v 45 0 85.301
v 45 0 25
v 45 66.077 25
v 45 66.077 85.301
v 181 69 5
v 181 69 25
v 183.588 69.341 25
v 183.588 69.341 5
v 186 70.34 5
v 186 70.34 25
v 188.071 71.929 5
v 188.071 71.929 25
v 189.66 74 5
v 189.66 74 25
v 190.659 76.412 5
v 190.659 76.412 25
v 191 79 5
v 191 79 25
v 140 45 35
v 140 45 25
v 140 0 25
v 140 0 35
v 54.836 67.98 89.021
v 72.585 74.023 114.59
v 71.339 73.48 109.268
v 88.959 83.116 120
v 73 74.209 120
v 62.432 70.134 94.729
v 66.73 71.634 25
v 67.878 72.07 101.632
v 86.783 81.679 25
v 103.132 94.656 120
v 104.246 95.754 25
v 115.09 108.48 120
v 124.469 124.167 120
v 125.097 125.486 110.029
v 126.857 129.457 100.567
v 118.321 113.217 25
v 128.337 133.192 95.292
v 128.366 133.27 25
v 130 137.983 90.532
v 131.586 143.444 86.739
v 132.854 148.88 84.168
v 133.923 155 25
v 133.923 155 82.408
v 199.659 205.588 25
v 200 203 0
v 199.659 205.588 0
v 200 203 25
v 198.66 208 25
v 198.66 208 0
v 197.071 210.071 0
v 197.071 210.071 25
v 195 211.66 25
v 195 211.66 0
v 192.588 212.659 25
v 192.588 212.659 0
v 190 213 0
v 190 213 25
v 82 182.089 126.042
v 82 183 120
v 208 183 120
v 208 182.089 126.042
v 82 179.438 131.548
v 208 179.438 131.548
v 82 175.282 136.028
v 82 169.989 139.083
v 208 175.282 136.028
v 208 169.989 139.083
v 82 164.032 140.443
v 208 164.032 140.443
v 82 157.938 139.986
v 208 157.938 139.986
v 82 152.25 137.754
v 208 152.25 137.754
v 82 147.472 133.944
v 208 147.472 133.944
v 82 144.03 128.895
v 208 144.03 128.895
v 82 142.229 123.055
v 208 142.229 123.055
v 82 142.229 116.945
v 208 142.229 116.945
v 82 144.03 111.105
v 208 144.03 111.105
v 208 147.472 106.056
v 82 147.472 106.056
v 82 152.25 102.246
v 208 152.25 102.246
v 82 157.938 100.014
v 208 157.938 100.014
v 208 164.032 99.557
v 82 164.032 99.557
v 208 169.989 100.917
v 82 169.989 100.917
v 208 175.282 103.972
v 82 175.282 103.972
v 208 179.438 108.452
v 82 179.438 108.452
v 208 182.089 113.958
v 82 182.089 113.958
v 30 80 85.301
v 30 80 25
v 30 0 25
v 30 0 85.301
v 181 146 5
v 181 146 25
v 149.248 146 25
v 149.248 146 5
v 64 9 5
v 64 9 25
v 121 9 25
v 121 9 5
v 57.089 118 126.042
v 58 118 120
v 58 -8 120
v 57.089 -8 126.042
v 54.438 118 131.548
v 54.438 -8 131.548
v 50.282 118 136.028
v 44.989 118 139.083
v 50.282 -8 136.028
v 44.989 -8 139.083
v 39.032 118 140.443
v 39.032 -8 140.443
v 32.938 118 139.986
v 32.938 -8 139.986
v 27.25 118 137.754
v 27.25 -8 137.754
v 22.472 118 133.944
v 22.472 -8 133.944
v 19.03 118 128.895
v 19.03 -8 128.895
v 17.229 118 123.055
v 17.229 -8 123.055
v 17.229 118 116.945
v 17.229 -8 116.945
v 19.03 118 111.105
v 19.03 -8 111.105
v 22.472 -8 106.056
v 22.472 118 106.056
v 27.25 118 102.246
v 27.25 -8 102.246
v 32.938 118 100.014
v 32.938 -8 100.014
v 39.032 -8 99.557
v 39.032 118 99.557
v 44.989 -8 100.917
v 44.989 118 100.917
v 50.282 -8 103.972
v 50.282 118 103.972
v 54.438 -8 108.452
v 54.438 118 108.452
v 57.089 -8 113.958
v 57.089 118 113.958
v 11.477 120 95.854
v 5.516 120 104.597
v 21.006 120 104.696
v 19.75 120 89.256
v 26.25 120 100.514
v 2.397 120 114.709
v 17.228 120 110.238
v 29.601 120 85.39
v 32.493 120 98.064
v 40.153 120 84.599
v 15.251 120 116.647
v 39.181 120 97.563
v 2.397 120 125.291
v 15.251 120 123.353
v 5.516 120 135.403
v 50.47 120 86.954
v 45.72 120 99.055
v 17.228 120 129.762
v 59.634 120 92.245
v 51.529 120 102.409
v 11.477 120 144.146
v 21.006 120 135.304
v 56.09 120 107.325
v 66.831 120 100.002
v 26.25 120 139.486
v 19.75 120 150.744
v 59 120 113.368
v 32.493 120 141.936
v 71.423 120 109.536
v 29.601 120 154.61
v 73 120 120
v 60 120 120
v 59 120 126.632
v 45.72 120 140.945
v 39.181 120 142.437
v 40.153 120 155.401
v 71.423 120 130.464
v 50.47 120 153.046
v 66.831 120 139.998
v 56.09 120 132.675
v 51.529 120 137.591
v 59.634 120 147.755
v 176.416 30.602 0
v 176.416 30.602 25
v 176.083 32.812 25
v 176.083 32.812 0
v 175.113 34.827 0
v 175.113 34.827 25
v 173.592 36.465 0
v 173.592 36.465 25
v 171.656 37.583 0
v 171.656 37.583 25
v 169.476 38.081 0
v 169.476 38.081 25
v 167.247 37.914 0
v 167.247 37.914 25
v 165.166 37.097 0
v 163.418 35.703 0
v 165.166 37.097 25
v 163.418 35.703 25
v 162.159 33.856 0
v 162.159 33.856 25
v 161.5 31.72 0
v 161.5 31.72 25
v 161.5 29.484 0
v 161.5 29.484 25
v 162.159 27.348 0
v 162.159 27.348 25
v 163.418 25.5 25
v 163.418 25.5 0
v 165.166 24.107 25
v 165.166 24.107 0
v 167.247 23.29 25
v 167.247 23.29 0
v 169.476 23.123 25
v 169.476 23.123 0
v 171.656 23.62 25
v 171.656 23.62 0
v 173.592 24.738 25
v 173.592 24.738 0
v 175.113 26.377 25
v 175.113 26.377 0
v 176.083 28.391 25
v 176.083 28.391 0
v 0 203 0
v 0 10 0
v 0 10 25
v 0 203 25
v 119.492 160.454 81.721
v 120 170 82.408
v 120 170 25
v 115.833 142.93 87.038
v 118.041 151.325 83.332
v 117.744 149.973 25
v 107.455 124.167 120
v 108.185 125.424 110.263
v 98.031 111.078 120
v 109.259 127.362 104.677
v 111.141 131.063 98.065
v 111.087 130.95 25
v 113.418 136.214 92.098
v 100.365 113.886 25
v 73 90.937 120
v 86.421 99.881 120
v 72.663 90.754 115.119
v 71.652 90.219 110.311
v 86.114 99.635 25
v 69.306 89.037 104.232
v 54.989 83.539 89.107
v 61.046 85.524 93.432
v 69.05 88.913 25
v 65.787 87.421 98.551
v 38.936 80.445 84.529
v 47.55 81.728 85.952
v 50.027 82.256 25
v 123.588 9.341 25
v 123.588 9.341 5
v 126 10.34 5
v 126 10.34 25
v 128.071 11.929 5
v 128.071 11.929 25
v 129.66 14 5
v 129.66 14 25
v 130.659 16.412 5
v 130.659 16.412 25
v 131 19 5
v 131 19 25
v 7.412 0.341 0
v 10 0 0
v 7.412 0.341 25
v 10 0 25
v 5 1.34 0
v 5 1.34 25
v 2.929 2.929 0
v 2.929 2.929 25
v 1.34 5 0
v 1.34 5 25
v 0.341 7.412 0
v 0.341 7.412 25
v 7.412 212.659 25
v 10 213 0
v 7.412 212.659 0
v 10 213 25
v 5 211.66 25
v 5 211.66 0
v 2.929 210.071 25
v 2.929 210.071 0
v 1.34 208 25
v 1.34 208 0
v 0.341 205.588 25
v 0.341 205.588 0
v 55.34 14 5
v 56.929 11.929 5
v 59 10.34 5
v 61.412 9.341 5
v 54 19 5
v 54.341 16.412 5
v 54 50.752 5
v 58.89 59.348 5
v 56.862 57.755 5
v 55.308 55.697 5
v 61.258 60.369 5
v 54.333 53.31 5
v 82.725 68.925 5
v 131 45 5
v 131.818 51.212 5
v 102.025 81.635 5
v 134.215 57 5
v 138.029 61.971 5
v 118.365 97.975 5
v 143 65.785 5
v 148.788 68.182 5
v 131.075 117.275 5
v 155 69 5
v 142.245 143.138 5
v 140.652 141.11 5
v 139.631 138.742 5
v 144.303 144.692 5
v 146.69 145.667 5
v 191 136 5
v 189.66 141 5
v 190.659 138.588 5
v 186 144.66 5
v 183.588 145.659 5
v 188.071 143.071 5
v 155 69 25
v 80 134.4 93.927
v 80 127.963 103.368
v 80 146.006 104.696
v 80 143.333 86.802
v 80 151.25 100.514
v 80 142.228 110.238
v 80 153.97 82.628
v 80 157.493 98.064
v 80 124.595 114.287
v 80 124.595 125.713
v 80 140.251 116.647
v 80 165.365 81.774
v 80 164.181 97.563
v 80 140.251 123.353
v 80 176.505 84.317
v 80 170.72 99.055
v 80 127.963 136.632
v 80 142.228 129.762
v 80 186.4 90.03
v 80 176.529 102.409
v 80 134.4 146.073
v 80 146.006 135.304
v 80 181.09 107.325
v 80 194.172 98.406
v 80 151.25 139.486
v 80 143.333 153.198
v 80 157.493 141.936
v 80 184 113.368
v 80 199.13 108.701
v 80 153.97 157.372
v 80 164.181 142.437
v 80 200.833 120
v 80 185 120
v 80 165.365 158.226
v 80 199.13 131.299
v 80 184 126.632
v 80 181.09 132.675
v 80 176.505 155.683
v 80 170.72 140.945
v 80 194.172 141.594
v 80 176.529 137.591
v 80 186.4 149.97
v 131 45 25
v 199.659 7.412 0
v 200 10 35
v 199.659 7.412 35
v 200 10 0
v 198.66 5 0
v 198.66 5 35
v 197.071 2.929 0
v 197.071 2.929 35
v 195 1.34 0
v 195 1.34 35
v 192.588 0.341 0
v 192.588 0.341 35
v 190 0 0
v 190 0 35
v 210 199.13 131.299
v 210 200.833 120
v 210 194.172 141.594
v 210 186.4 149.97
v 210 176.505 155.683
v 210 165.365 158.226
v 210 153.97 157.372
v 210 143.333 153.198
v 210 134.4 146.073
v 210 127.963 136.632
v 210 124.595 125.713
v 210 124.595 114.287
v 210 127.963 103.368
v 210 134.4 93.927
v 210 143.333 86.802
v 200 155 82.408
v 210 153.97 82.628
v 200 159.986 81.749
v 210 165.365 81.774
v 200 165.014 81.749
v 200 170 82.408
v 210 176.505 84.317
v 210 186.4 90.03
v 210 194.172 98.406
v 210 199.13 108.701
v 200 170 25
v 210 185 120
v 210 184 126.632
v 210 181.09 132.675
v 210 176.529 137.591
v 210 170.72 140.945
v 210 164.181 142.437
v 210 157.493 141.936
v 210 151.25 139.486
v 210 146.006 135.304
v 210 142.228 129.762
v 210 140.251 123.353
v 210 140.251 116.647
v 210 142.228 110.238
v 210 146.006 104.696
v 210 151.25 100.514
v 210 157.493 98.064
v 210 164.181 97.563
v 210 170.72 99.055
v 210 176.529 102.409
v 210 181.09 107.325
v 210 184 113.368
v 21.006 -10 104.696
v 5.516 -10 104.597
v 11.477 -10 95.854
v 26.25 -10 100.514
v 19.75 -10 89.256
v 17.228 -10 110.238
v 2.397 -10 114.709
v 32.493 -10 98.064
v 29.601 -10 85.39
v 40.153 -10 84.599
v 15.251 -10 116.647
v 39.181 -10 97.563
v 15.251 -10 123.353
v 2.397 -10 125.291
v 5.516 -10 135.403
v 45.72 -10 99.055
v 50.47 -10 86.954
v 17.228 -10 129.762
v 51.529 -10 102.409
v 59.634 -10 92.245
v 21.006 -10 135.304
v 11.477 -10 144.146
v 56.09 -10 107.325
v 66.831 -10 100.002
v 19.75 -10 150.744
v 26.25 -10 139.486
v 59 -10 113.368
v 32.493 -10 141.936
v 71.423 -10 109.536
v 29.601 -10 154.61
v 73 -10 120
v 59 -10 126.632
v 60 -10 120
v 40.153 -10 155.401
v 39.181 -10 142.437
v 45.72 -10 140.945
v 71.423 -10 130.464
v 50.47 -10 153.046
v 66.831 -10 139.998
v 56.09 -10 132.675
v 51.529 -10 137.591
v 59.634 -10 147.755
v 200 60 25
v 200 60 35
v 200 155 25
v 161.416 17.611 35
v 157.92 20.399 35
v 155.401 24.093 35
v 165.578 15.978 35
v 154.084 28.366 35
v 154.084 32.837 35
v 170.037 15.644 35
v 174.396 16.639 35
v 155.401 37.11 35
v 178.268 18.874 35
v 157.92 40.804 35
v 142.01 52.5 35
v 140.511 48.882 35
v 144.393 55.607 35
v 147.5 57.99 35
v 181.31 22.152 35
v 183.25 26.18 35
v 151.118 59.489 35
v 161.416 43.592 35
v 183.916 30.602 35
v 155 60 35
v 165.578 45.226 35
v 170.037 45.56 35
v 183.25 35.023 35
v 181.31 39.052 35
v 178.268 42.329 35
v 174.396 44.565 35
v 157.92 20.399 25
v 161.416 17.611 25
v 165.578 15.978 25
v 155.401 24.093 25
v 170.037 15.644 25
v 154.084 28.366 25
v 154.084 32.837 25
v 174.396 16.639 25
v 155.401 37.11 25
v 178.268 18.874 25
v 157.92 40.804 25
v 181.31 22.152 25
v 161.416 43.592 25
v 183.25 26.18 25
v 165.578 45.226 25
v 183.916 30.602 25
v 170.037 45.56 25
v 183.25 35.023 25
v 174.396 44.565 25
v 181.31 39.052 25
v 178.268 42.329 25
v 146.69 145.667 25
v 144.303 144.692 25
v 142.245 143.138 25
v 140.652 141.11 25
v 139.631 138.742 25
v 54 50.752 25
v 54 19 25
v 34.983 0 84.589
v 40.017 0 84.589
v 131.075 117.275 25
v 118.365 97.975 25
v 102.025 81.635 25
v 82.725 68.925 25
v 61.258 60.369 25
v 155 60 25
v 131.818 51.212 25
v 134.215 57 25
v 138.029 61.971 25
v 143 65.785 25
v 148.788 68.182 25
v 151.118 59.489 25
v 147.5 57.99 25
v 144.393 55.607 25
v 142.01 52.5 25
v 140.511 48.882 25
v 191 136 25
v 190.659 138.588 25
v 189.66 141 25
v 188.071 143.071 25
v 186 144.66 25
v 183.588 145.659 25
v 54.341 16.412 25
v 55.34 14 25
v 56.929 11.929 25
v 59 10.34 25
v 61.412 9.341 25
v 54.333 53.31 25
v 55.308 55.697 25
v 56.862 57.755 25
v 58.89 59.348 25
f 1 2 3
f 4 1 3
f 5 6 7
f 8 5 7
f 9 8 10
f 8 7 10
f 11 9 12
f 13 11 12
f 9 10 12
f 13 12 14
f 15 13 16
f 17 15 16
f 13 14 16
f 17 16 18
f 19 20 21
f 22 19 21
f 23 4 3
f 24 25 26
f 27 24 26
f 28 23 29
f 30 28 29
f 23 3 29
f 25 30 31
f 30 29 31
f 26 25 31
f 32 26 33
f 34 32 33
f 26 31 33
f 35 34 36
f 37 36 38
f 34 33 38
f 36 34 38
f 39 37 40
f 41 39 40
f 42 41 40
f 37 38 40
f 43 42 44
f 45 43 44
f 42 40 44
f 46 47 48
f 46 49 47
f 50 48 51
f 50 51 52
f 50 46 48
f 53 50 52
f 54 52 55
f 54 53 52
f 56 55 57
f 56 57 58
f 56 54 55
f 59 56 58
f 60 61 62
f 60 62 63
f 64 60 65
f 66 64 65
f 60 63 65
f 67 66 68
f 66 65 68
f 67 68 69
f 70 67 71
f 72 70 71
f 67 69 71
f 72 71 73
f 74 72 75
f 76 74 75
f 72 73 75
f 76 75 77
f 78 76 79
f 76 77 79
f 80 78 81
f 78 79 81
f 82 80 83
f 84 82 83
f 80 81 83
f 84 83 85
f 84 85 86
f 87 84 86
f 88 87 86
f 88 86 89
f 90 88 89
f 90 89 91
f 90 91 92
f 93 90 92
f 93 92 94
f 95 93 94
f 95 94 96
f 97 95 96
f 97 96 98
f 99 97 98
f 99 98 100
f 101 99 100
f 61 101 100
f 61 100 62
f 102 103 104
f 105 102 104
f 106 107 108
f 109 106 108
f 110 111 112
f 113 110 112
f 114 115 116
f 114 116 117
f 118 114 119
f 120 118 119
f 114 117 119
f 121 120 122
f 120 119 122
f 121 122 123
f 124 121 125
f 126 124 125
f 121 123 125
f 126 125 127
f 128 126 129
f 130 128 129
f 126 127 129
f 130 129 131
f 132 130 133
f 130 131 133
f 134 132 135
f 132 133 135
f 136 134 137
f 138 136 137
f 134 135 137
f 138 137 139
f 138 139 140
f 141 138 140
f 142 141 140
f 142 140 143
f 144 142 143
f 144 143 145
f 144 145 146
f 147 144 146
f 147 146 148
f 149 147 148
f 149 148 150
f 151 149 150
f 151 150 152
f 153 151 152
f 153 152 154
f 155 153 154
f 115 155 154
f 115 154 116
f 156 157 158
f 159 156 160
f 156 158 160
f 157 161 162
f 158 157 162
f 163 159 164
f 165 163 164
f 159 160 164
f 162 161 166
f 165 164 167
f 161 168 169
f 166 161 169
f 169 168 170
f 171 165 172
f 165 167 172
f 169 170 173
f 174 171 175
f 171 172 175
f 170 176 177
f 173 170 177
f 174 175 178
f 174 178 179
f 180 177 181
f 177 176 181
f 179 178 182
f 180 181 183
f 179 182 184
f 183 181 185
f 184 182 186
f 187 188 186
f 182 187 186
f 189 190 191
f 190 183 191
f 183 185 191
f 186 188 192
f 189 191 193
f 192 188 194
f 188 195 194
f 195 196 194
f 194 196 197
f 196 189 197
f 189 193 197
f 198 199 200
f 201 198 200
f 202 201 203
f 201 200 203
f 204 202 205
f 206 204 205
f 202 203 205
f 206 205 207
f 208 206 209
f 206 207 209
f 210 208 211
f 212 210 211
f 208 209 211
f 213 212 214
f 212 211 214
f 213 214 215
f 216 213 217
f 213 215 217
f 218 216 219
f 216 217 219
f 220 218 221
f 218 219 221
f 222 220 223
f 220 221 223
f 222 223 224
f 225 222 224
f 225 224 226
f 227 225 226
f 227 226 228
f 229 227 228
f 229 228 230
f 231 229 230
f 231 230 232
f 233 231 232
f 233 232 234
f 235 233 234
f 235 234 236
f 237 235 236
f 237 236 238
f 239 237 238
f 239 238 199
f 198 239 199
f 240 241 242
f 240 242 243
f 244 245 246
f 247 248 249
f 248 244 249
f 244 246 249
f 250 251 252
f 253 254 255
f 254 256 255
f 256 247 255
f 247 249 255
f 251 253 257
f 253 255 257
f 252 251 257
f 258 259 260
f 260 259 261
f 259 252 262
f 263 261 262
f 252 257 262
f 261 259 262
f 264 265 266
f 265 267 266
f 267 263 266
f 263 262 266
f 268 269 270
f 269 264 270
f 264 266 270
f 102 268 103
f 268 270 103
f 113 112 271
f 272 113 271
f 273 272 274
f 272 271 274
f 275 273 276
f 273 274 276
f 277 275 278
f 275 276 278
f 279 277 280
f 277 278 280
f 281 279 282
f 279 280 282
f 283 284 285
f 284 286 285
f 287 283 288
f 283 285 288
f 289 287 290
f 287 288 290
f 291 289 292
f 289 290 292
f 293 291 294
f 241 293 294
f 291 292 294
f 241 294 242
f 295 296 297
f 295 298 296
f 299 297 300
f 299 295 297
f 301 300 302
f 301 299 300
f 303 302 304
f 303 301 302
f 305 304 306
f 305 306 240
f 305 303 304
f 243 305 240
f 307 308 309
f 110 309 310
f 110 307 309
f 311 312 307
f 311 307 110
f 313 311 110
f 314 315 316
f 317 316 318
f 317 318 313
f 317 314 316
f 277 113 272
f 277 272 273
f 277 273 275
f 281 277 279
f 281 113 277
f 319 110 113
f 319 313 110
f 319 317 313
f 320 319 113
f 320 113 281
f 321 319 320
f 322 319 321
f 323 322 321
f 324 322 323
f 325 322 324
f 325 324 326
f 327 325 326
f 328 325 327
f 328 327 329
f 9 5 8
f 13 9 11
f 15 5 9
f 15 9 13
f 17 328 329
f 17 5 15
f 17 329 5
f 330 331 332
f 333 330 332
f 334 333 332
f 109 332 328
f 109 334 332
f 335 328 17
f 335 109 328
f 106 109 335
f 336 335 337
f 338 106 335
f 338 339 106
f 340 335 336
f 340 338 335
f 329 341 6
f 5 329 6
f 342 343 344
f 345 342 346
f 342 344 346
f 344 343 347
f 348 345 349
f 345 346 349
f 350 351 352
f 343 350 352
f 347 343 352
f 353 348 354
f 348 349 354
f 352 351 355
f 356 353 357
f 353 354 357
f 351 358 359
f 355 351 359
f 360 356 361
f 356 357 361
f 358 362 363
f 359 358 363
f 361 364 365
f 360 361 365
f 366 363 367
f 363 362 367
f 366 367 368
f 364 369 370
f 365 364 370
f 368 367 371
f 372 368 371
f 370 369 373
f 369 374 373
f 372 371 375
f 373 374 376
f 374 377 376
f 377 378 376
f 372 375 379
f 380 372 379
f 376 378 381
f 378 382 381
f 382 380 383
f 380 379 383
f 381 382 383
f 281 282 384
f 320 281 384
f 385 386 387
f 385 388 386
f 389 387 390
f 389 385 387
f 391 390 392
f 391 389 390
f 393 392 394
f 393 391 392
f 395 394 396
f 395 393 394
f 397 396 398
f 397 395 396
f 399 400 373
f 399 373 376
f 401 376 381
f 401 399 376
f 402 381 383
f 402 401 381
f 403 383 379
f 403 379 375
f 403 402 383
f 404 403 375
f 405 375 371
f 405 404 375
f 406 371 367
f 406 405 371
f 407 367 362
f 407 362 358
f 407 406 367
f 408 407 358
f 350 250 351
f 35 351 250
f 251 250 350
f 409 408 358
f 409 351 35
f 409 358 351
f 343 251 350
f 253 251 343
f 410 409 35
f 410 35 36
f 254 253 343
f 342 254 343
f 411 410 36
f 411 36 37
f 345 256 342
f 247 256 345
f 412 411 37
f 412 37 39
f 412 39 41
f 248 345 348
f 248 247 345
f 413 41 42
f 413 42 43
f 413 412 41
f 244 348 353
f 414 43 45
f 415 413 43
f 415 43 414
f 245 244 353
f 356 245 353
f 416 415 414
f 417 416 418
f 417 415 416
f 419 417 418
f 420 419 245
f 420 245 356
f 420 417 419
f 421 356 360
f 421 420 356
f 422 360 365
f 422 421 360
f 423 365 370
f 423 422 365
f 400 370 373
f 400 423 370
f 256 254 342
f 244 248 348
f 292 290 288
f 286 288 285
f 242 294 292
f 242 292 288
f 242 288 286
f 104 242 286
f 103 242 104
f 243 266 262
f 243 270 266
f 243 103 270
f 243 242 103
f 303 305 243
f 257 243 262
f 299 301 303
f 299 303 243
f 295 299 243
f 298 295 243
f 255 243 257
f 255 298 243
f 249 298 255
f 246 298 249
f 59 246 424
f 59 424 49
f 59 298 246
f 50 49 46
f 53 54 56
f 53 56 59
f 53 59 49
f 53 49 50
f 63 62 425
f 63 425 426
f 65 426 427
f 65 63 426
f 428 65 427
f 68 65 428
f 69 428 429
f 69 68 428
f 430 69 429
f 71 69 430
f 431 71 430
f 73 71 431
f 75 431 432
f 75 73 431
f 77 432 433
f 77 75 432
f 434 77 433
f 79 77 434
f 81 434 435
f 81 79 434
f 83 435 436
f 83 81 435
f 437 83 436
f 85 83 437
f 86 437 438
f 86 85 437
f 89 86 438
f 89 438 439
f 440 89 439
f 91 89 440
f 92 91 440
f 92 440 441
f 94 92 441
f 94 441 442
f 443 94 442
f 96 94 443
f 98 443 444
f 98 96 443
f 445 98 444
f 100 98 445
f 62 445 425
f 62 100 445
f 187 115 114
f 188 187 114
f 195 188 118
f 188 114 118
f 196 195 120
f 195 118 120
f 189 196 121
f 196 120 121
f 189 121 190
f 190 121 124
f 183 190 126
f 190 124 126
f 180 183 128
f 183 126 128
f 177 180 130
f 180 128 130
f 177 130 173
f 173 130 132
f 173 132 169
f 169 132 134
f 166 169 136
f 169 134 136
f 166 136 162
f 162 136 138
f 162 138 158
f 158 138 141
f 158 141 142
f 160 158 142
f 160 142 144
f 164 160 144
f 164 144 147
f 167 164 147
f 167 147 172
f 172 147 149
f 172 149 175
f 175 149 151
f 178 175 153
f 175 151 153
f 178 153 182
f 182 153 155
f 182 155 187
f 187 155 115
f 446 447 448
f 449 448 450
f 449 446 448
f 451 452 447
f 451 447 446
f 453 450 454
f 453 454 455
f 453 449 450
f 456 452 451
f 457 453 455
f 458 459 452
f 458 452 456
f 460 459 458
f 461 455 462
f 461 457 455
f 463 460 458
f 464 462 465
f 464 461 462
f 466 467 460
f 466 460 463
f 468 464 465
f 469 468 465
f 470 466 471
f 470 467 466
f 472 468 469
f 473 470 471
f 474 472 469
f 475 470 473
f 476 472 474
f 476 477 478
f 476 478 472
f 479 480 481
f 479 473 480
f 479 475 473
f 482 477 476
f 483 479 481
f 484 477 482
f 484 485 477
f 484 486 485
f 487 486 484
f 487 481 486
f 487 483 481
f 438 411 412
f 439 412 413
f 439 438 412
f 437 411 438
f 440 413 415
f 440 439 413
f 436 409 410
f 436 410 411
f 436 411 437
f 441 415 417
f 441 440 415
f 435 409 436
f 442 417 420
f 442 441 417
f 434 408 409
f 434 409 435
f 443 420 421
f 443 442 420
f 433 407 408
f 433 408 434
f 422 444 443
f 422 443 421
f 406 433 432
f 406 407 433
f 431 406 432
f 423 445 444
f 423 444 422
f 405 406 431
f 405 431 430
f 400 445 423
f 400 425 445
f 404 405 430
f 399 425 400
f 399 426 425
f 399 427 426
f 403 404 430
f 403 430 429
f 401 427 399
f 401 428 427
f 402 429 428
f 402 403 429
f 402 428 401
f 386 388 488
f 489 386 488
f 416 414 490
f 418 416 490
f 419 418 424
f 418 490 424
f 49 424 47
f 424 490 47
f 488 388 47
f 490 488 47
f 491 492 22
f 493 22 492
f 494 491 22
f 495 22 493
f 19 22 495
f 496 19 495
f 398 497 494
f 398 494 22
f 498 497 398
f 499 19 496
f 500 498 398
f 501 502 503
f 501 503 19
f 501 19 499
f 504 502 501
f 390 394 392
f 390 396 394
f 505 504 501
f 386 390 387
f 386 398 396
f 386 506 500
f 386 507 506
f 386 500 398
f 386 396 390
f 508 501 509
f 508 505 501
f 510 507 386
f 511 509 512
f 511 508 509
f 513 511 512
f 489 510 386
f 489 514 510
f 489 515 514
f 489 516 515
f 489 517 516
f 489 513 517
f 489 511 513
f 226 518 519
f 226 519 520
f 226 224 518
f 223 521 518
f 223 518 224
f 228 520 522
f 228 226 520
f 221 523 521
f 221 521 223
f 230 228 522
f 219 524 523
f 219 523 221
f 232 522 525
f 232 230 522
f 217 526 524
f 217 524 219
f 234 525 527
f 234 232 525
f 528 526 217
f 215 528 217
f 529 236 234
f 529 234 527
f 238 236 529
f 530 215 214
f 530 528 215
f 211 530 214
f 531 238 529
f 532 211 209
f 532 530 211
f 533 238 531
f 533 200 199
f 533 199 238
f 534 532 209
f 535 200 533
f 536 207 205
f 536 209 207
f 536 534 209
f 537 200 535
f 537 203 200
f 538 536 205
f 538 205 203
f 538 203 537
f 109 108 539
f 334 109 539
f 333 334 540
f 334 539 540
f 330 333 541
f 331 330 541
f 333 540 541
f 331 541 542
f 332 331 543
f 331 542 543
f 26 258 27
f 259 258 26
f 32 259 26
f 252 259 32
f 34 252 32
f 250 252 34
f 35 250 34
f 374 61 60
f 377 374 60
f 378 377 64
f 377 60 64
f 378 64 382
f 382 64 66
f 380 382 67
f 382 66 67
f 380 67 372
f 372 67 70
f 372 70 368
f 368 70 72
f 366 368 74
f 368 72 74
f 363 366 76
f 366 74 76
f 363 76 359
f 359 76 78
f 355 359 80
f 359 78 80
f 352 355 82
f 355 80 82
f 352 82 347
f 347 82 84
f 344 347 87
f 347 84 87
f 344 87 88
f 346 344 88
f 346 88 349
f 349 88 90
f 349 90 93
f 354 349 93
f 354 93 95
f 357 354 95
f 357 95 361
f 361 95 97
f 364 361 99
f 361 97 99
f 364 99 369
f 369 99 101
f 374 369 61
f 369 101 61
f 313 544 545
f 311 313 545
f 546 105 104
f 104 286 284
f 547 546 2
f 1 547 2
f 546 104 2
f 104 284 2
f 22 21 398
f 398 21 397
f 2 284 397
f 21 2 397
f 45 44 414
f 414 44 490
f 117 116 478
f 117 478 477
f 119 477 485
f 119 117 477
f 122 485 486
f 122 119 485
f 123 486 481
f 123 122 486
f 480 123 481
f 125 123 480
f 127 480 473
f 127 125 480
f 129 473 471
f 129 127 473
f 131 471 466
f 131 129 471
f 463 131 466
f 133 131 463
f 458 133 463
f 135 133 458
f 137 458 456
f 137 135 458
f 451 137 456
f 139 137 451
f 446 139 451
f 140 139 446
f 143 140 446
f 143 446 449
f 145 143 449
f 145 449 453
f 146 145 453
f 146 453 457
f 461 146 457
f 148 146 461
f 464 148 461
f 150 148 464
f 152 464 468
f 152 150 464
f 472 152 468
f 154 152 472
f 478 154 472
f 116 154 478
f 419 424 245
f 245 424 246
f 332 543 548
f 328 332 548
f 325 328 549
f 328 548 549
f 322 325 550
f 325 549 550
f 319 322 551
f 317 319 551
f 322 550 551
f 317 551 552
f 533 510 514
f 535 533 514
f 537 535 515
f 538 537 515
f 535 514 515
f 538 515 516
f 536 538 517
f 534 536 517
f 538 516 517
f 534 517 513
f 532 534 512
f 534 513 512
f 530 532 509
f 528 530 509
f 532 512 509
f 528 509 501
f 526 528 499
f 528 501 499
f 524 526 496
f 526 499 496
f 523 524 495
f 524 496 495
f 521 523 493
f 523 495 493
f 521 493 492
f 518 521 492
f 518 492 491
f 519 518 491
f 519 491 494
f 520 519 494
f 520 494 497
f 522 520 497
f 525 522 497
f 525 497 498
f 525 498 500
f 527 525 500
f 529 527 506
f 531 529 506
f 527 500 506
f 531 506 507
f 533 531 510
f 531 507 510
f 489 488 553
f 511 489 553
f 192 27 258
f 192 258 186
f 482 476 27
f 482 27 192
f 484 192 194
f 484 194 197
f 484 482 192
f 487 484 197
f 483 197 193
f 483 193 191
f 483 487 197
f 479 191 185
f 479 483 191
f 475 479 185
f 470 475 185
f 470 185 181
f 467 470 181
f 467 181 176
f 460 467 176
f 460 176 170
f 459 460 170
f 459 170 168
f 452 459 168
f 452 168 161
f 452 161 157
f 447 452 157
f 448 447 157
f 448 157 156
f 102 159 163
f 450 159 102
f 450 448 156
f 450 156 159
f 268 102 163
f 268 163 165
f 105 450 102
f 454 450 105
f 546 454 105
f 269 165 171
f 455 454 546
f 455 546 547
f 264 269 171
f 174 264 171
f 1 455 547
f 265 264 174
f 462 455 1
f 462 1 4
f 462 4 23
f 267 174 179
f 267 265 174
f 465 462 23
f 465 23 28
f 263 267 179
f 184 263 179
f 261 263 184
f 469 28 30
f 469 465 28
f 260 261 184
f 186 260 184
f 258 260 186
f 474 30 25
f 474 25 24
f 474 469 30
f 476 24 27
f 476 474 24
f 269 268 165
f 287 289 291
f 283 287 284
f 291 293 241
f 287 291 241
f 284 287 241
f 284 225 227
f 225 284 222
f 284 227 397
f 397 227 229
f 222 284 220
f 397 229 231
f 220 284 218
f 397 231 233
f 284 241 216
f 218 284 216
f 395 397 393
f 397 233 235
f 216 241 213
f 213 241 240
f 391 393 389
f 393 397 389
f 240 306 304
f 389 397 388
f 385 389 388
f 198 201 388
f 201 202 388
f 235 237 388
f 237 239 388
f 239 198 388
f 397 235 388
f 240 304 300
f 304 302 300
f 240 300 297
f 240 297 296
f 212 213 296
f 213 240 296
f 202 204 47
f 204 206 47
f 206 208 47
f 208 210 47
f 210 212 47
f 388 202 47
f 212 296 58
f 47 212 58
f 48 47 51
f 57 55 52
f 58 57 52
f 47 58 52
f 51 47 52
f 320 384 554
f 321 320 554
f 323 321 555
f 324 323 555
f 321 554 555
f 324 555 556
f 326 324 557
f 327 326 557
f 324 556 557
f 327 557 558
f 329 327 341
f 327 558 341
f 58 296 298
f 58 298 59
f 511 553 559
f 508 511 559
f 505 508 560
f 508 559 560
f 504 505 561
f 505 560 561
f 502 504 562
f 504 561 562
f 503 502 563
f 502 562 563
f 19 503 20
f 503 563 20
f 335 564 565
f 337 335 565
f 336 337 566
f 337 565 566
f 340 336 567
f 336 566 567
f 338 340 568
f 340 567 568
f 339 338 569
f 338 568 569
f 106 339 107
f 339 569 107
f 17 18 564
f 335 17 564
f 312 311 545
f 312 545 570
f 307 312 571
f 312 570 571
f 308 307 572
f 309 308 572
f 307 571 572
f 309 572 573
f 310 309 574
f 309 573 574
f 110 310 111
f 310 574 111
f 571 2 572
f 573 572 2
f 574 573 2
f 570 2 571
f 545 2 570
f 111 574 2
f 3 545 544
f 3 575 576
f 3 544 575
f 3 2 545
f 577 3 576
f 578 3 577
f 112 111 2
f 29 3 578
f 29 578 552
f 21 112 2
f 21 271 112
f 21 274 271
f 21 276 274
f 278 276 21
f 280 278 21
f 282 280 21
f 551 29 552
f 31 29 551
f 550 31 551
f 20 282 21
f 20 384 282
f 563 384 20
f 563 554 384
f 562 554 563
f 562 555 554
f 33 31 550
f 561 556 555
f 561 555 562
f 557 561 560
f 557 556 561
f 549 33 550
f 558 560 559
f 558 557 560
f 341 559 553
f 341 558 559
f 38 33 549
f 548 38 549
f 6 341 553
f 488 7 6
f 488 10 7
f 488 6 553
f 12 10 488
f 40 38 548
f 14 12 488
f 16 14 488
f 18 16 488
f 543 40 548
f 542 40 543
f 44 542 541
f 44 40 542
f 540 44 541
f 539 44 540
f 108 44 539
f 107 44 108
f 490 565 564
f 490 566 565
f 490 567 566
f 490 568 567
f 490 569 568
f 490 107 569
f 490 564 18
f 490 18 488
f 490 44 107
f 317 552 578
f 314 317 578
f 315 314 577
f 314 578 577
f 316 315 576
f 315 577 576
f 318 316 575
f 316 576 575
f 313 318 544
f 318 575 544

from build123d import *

# Parameters (mm, degrees)
F0_W      = 200
F0_H      = 213
F1_DEPTH  = 25
F3_DEPTH  = 95
F5_DEPTH  = 10
F6_R      = 15
F7_DEPTH  = 10
F8_R      = 7.5
F9_DEPTH  = 25.001
F11_DEPTH = 20
F13_R     = 35.5
F14_DEPTH = 130
F15_R     = 20.5
F16_DEPTH = 223.001
F18_R     = 38.3333333333
F19_DEPTH = 130
F20_R     = 20.5
F21_DEPTH = 210.001
F22_R     = 10
F23_SIZE2 = 2
F23_SIZE  = 2


with BuildPart() as f1:
    # F0 (on Top) → F1 (new body)
    with BuildSketch(Plane.XY):
        with Locations((100, 106.5)):
            Rectangle(F0_W, F0_H)
    extrude(amount=F1_DEPTH)

    # F2 (on face) → F3 (join)
    with BuildSketch(Plane.XY.offset(25)):
        with BuildLine():
            Line((30, 80), (30, 0))
            Line((30, 0), (45, 0))
            Line((45, 0), (45, 66.0769515459))
            ThreePointArc((45, 66.0769515459), (104.2462120246, 95.7537879754), (133.9230484541, 155))
            Line((133.9230484541, 155), (200, 155))
            Line((200, 155), (200, 170))
            Line((200, 170), (120, 170))
            ThreePointArc((120, 170), (93.6396103068, 106.3603896932), (30, 80))
        make_face()
    extrude(amount=F3_DEPTH)

    # F4 (on face) → F5 (join)
    with BuildSketch(Plane.XY.offset(25)):
        with BuildLine():
            Line((200, 60), (155, 60))
            ThreePointArc((155, 60), (144.3933982822, 55.6066017178), (140, 45))
            Line((140, 45), (140, 0))
            Line((140, 0), (200, 0))
            Line((200, 0), (200, 60))
        make_face()
    extrude(amount=F5_DEPTH)

    # F6 (on face) → F7 (cut)
    with BuildSketch(Plane.XY.offset(35)):
        with Locations((168.9159870148, 30.6017436087)):
            Circle(F6_R)
    extrude(amount=-F7_DEPTH, mode=Mode.SUBTRACT)

    # F8 (on face) → F9 (cut, through all)
    with BuildSketch(Plane.XY.offset(25)):
        with Locations((168.9159870148, 30.6017436087)):
            Circle(F8_R)
    extrude(amount=-F9_DEPTH, mode=Mode.SUBTRACT)

    # F10 (on face) → F11 (cut)
    with BuildSketch(Plane.XY.offset(25)):
        with BuildLine():
            Line((181, 146), (149.2476414861, 146))
            ThreePointArc((149.2476414861, 146), (143.2234965193, 143.981834214), (139.630896205, 138.7419354839))
            ThreePointArc((139.630896205, 138.7419354839), (110.6101730553, 89.3898269447), (61.2580645161, 60.369103795))
            ThreePointArc((61.2580645161, 60.369103795), (56.018165786, 56.7765034807), (54, 50.7523585139))
            Line((54, 50.7523585139), (54, 19))
            ThreePointArc((54, 19), (56.9289321881, 11.9289321881), (64, 9))
            Line((64, 9), (121, 9))
            ThreePointArc((121, 9), (128.0710678119, 11.9289321881), (131, 19))
            Line((131, 19), (131, 45))
            ThreePointArc((131, 45), (138.0294372515, 61.9705627485), (155, 69))
            Line((155, 69), (181, 69))
            ThreePointArc((181, 69), (188.0710678119, 71.9289321881), (191, 79))
            Line((191, 79), (191, 136))
            ThreePointArc((191, 136), (188.0710678119, 143.0710678119), (181, 146))
        make_face()
    extrude(amount=-F11_DEPTH, mode=Mode.SUBTRACT)

    # F13 (on offset) → F14 (join)
    with BuildSketch(Plane.XZ.offset(10)):
        with Locations((37.5, 120)):
            Circle(F13_R)
    extrude(amount=-F14_DEPTH)

    # F15 (on face) → F16 (cut, through all)
    with BuildSketch(Plane.XZ.offset(10)):
        with Locations((37.5, 120)):
            Circle(F15_R)
    extrude(amount=-F16_DEPTH, mode=Mode.SUBTRACT)

    # F18 (on offset) → F19 (join)
    with BuildSketch(Plane.YZ.offset(210)):
        with Locations((162.5, 120)):
            Circle(F18_R)
    extrude(amount=-F19_DEPTH)

    # F20 (on face) → F21 (cut, through all)
    with BuildSketch(Plane.YZ.offset(210)):
        with Locations((162.5, 120)):
            Circle(F20_R)
    extrude(amount=-F21_DEPTH, mode=Mode.SUBTRACT)

    # F22
    f22_edges = [f1.edges().sort_by_distance(p)[0] for p in [
        (0, 0, 12.5),
        (200, 0, 17.5),
        (200, 213, 12.5),
        (0, 213, 12.5),
    ]]
    fillet(f22_edges, radius=F22_R)

    # F23
    f23_edges = [f1.edges().sort_by_distance(p)[0] for p in [
        (17, -10, 120),
        (210, 142, 120),
        (17, 120, 120),
        (80, 142, 120),
    ]]
    chamfer(f23_edges, length=F23_SIZE, length2=F23_SIZE2)


solid = f1.part
